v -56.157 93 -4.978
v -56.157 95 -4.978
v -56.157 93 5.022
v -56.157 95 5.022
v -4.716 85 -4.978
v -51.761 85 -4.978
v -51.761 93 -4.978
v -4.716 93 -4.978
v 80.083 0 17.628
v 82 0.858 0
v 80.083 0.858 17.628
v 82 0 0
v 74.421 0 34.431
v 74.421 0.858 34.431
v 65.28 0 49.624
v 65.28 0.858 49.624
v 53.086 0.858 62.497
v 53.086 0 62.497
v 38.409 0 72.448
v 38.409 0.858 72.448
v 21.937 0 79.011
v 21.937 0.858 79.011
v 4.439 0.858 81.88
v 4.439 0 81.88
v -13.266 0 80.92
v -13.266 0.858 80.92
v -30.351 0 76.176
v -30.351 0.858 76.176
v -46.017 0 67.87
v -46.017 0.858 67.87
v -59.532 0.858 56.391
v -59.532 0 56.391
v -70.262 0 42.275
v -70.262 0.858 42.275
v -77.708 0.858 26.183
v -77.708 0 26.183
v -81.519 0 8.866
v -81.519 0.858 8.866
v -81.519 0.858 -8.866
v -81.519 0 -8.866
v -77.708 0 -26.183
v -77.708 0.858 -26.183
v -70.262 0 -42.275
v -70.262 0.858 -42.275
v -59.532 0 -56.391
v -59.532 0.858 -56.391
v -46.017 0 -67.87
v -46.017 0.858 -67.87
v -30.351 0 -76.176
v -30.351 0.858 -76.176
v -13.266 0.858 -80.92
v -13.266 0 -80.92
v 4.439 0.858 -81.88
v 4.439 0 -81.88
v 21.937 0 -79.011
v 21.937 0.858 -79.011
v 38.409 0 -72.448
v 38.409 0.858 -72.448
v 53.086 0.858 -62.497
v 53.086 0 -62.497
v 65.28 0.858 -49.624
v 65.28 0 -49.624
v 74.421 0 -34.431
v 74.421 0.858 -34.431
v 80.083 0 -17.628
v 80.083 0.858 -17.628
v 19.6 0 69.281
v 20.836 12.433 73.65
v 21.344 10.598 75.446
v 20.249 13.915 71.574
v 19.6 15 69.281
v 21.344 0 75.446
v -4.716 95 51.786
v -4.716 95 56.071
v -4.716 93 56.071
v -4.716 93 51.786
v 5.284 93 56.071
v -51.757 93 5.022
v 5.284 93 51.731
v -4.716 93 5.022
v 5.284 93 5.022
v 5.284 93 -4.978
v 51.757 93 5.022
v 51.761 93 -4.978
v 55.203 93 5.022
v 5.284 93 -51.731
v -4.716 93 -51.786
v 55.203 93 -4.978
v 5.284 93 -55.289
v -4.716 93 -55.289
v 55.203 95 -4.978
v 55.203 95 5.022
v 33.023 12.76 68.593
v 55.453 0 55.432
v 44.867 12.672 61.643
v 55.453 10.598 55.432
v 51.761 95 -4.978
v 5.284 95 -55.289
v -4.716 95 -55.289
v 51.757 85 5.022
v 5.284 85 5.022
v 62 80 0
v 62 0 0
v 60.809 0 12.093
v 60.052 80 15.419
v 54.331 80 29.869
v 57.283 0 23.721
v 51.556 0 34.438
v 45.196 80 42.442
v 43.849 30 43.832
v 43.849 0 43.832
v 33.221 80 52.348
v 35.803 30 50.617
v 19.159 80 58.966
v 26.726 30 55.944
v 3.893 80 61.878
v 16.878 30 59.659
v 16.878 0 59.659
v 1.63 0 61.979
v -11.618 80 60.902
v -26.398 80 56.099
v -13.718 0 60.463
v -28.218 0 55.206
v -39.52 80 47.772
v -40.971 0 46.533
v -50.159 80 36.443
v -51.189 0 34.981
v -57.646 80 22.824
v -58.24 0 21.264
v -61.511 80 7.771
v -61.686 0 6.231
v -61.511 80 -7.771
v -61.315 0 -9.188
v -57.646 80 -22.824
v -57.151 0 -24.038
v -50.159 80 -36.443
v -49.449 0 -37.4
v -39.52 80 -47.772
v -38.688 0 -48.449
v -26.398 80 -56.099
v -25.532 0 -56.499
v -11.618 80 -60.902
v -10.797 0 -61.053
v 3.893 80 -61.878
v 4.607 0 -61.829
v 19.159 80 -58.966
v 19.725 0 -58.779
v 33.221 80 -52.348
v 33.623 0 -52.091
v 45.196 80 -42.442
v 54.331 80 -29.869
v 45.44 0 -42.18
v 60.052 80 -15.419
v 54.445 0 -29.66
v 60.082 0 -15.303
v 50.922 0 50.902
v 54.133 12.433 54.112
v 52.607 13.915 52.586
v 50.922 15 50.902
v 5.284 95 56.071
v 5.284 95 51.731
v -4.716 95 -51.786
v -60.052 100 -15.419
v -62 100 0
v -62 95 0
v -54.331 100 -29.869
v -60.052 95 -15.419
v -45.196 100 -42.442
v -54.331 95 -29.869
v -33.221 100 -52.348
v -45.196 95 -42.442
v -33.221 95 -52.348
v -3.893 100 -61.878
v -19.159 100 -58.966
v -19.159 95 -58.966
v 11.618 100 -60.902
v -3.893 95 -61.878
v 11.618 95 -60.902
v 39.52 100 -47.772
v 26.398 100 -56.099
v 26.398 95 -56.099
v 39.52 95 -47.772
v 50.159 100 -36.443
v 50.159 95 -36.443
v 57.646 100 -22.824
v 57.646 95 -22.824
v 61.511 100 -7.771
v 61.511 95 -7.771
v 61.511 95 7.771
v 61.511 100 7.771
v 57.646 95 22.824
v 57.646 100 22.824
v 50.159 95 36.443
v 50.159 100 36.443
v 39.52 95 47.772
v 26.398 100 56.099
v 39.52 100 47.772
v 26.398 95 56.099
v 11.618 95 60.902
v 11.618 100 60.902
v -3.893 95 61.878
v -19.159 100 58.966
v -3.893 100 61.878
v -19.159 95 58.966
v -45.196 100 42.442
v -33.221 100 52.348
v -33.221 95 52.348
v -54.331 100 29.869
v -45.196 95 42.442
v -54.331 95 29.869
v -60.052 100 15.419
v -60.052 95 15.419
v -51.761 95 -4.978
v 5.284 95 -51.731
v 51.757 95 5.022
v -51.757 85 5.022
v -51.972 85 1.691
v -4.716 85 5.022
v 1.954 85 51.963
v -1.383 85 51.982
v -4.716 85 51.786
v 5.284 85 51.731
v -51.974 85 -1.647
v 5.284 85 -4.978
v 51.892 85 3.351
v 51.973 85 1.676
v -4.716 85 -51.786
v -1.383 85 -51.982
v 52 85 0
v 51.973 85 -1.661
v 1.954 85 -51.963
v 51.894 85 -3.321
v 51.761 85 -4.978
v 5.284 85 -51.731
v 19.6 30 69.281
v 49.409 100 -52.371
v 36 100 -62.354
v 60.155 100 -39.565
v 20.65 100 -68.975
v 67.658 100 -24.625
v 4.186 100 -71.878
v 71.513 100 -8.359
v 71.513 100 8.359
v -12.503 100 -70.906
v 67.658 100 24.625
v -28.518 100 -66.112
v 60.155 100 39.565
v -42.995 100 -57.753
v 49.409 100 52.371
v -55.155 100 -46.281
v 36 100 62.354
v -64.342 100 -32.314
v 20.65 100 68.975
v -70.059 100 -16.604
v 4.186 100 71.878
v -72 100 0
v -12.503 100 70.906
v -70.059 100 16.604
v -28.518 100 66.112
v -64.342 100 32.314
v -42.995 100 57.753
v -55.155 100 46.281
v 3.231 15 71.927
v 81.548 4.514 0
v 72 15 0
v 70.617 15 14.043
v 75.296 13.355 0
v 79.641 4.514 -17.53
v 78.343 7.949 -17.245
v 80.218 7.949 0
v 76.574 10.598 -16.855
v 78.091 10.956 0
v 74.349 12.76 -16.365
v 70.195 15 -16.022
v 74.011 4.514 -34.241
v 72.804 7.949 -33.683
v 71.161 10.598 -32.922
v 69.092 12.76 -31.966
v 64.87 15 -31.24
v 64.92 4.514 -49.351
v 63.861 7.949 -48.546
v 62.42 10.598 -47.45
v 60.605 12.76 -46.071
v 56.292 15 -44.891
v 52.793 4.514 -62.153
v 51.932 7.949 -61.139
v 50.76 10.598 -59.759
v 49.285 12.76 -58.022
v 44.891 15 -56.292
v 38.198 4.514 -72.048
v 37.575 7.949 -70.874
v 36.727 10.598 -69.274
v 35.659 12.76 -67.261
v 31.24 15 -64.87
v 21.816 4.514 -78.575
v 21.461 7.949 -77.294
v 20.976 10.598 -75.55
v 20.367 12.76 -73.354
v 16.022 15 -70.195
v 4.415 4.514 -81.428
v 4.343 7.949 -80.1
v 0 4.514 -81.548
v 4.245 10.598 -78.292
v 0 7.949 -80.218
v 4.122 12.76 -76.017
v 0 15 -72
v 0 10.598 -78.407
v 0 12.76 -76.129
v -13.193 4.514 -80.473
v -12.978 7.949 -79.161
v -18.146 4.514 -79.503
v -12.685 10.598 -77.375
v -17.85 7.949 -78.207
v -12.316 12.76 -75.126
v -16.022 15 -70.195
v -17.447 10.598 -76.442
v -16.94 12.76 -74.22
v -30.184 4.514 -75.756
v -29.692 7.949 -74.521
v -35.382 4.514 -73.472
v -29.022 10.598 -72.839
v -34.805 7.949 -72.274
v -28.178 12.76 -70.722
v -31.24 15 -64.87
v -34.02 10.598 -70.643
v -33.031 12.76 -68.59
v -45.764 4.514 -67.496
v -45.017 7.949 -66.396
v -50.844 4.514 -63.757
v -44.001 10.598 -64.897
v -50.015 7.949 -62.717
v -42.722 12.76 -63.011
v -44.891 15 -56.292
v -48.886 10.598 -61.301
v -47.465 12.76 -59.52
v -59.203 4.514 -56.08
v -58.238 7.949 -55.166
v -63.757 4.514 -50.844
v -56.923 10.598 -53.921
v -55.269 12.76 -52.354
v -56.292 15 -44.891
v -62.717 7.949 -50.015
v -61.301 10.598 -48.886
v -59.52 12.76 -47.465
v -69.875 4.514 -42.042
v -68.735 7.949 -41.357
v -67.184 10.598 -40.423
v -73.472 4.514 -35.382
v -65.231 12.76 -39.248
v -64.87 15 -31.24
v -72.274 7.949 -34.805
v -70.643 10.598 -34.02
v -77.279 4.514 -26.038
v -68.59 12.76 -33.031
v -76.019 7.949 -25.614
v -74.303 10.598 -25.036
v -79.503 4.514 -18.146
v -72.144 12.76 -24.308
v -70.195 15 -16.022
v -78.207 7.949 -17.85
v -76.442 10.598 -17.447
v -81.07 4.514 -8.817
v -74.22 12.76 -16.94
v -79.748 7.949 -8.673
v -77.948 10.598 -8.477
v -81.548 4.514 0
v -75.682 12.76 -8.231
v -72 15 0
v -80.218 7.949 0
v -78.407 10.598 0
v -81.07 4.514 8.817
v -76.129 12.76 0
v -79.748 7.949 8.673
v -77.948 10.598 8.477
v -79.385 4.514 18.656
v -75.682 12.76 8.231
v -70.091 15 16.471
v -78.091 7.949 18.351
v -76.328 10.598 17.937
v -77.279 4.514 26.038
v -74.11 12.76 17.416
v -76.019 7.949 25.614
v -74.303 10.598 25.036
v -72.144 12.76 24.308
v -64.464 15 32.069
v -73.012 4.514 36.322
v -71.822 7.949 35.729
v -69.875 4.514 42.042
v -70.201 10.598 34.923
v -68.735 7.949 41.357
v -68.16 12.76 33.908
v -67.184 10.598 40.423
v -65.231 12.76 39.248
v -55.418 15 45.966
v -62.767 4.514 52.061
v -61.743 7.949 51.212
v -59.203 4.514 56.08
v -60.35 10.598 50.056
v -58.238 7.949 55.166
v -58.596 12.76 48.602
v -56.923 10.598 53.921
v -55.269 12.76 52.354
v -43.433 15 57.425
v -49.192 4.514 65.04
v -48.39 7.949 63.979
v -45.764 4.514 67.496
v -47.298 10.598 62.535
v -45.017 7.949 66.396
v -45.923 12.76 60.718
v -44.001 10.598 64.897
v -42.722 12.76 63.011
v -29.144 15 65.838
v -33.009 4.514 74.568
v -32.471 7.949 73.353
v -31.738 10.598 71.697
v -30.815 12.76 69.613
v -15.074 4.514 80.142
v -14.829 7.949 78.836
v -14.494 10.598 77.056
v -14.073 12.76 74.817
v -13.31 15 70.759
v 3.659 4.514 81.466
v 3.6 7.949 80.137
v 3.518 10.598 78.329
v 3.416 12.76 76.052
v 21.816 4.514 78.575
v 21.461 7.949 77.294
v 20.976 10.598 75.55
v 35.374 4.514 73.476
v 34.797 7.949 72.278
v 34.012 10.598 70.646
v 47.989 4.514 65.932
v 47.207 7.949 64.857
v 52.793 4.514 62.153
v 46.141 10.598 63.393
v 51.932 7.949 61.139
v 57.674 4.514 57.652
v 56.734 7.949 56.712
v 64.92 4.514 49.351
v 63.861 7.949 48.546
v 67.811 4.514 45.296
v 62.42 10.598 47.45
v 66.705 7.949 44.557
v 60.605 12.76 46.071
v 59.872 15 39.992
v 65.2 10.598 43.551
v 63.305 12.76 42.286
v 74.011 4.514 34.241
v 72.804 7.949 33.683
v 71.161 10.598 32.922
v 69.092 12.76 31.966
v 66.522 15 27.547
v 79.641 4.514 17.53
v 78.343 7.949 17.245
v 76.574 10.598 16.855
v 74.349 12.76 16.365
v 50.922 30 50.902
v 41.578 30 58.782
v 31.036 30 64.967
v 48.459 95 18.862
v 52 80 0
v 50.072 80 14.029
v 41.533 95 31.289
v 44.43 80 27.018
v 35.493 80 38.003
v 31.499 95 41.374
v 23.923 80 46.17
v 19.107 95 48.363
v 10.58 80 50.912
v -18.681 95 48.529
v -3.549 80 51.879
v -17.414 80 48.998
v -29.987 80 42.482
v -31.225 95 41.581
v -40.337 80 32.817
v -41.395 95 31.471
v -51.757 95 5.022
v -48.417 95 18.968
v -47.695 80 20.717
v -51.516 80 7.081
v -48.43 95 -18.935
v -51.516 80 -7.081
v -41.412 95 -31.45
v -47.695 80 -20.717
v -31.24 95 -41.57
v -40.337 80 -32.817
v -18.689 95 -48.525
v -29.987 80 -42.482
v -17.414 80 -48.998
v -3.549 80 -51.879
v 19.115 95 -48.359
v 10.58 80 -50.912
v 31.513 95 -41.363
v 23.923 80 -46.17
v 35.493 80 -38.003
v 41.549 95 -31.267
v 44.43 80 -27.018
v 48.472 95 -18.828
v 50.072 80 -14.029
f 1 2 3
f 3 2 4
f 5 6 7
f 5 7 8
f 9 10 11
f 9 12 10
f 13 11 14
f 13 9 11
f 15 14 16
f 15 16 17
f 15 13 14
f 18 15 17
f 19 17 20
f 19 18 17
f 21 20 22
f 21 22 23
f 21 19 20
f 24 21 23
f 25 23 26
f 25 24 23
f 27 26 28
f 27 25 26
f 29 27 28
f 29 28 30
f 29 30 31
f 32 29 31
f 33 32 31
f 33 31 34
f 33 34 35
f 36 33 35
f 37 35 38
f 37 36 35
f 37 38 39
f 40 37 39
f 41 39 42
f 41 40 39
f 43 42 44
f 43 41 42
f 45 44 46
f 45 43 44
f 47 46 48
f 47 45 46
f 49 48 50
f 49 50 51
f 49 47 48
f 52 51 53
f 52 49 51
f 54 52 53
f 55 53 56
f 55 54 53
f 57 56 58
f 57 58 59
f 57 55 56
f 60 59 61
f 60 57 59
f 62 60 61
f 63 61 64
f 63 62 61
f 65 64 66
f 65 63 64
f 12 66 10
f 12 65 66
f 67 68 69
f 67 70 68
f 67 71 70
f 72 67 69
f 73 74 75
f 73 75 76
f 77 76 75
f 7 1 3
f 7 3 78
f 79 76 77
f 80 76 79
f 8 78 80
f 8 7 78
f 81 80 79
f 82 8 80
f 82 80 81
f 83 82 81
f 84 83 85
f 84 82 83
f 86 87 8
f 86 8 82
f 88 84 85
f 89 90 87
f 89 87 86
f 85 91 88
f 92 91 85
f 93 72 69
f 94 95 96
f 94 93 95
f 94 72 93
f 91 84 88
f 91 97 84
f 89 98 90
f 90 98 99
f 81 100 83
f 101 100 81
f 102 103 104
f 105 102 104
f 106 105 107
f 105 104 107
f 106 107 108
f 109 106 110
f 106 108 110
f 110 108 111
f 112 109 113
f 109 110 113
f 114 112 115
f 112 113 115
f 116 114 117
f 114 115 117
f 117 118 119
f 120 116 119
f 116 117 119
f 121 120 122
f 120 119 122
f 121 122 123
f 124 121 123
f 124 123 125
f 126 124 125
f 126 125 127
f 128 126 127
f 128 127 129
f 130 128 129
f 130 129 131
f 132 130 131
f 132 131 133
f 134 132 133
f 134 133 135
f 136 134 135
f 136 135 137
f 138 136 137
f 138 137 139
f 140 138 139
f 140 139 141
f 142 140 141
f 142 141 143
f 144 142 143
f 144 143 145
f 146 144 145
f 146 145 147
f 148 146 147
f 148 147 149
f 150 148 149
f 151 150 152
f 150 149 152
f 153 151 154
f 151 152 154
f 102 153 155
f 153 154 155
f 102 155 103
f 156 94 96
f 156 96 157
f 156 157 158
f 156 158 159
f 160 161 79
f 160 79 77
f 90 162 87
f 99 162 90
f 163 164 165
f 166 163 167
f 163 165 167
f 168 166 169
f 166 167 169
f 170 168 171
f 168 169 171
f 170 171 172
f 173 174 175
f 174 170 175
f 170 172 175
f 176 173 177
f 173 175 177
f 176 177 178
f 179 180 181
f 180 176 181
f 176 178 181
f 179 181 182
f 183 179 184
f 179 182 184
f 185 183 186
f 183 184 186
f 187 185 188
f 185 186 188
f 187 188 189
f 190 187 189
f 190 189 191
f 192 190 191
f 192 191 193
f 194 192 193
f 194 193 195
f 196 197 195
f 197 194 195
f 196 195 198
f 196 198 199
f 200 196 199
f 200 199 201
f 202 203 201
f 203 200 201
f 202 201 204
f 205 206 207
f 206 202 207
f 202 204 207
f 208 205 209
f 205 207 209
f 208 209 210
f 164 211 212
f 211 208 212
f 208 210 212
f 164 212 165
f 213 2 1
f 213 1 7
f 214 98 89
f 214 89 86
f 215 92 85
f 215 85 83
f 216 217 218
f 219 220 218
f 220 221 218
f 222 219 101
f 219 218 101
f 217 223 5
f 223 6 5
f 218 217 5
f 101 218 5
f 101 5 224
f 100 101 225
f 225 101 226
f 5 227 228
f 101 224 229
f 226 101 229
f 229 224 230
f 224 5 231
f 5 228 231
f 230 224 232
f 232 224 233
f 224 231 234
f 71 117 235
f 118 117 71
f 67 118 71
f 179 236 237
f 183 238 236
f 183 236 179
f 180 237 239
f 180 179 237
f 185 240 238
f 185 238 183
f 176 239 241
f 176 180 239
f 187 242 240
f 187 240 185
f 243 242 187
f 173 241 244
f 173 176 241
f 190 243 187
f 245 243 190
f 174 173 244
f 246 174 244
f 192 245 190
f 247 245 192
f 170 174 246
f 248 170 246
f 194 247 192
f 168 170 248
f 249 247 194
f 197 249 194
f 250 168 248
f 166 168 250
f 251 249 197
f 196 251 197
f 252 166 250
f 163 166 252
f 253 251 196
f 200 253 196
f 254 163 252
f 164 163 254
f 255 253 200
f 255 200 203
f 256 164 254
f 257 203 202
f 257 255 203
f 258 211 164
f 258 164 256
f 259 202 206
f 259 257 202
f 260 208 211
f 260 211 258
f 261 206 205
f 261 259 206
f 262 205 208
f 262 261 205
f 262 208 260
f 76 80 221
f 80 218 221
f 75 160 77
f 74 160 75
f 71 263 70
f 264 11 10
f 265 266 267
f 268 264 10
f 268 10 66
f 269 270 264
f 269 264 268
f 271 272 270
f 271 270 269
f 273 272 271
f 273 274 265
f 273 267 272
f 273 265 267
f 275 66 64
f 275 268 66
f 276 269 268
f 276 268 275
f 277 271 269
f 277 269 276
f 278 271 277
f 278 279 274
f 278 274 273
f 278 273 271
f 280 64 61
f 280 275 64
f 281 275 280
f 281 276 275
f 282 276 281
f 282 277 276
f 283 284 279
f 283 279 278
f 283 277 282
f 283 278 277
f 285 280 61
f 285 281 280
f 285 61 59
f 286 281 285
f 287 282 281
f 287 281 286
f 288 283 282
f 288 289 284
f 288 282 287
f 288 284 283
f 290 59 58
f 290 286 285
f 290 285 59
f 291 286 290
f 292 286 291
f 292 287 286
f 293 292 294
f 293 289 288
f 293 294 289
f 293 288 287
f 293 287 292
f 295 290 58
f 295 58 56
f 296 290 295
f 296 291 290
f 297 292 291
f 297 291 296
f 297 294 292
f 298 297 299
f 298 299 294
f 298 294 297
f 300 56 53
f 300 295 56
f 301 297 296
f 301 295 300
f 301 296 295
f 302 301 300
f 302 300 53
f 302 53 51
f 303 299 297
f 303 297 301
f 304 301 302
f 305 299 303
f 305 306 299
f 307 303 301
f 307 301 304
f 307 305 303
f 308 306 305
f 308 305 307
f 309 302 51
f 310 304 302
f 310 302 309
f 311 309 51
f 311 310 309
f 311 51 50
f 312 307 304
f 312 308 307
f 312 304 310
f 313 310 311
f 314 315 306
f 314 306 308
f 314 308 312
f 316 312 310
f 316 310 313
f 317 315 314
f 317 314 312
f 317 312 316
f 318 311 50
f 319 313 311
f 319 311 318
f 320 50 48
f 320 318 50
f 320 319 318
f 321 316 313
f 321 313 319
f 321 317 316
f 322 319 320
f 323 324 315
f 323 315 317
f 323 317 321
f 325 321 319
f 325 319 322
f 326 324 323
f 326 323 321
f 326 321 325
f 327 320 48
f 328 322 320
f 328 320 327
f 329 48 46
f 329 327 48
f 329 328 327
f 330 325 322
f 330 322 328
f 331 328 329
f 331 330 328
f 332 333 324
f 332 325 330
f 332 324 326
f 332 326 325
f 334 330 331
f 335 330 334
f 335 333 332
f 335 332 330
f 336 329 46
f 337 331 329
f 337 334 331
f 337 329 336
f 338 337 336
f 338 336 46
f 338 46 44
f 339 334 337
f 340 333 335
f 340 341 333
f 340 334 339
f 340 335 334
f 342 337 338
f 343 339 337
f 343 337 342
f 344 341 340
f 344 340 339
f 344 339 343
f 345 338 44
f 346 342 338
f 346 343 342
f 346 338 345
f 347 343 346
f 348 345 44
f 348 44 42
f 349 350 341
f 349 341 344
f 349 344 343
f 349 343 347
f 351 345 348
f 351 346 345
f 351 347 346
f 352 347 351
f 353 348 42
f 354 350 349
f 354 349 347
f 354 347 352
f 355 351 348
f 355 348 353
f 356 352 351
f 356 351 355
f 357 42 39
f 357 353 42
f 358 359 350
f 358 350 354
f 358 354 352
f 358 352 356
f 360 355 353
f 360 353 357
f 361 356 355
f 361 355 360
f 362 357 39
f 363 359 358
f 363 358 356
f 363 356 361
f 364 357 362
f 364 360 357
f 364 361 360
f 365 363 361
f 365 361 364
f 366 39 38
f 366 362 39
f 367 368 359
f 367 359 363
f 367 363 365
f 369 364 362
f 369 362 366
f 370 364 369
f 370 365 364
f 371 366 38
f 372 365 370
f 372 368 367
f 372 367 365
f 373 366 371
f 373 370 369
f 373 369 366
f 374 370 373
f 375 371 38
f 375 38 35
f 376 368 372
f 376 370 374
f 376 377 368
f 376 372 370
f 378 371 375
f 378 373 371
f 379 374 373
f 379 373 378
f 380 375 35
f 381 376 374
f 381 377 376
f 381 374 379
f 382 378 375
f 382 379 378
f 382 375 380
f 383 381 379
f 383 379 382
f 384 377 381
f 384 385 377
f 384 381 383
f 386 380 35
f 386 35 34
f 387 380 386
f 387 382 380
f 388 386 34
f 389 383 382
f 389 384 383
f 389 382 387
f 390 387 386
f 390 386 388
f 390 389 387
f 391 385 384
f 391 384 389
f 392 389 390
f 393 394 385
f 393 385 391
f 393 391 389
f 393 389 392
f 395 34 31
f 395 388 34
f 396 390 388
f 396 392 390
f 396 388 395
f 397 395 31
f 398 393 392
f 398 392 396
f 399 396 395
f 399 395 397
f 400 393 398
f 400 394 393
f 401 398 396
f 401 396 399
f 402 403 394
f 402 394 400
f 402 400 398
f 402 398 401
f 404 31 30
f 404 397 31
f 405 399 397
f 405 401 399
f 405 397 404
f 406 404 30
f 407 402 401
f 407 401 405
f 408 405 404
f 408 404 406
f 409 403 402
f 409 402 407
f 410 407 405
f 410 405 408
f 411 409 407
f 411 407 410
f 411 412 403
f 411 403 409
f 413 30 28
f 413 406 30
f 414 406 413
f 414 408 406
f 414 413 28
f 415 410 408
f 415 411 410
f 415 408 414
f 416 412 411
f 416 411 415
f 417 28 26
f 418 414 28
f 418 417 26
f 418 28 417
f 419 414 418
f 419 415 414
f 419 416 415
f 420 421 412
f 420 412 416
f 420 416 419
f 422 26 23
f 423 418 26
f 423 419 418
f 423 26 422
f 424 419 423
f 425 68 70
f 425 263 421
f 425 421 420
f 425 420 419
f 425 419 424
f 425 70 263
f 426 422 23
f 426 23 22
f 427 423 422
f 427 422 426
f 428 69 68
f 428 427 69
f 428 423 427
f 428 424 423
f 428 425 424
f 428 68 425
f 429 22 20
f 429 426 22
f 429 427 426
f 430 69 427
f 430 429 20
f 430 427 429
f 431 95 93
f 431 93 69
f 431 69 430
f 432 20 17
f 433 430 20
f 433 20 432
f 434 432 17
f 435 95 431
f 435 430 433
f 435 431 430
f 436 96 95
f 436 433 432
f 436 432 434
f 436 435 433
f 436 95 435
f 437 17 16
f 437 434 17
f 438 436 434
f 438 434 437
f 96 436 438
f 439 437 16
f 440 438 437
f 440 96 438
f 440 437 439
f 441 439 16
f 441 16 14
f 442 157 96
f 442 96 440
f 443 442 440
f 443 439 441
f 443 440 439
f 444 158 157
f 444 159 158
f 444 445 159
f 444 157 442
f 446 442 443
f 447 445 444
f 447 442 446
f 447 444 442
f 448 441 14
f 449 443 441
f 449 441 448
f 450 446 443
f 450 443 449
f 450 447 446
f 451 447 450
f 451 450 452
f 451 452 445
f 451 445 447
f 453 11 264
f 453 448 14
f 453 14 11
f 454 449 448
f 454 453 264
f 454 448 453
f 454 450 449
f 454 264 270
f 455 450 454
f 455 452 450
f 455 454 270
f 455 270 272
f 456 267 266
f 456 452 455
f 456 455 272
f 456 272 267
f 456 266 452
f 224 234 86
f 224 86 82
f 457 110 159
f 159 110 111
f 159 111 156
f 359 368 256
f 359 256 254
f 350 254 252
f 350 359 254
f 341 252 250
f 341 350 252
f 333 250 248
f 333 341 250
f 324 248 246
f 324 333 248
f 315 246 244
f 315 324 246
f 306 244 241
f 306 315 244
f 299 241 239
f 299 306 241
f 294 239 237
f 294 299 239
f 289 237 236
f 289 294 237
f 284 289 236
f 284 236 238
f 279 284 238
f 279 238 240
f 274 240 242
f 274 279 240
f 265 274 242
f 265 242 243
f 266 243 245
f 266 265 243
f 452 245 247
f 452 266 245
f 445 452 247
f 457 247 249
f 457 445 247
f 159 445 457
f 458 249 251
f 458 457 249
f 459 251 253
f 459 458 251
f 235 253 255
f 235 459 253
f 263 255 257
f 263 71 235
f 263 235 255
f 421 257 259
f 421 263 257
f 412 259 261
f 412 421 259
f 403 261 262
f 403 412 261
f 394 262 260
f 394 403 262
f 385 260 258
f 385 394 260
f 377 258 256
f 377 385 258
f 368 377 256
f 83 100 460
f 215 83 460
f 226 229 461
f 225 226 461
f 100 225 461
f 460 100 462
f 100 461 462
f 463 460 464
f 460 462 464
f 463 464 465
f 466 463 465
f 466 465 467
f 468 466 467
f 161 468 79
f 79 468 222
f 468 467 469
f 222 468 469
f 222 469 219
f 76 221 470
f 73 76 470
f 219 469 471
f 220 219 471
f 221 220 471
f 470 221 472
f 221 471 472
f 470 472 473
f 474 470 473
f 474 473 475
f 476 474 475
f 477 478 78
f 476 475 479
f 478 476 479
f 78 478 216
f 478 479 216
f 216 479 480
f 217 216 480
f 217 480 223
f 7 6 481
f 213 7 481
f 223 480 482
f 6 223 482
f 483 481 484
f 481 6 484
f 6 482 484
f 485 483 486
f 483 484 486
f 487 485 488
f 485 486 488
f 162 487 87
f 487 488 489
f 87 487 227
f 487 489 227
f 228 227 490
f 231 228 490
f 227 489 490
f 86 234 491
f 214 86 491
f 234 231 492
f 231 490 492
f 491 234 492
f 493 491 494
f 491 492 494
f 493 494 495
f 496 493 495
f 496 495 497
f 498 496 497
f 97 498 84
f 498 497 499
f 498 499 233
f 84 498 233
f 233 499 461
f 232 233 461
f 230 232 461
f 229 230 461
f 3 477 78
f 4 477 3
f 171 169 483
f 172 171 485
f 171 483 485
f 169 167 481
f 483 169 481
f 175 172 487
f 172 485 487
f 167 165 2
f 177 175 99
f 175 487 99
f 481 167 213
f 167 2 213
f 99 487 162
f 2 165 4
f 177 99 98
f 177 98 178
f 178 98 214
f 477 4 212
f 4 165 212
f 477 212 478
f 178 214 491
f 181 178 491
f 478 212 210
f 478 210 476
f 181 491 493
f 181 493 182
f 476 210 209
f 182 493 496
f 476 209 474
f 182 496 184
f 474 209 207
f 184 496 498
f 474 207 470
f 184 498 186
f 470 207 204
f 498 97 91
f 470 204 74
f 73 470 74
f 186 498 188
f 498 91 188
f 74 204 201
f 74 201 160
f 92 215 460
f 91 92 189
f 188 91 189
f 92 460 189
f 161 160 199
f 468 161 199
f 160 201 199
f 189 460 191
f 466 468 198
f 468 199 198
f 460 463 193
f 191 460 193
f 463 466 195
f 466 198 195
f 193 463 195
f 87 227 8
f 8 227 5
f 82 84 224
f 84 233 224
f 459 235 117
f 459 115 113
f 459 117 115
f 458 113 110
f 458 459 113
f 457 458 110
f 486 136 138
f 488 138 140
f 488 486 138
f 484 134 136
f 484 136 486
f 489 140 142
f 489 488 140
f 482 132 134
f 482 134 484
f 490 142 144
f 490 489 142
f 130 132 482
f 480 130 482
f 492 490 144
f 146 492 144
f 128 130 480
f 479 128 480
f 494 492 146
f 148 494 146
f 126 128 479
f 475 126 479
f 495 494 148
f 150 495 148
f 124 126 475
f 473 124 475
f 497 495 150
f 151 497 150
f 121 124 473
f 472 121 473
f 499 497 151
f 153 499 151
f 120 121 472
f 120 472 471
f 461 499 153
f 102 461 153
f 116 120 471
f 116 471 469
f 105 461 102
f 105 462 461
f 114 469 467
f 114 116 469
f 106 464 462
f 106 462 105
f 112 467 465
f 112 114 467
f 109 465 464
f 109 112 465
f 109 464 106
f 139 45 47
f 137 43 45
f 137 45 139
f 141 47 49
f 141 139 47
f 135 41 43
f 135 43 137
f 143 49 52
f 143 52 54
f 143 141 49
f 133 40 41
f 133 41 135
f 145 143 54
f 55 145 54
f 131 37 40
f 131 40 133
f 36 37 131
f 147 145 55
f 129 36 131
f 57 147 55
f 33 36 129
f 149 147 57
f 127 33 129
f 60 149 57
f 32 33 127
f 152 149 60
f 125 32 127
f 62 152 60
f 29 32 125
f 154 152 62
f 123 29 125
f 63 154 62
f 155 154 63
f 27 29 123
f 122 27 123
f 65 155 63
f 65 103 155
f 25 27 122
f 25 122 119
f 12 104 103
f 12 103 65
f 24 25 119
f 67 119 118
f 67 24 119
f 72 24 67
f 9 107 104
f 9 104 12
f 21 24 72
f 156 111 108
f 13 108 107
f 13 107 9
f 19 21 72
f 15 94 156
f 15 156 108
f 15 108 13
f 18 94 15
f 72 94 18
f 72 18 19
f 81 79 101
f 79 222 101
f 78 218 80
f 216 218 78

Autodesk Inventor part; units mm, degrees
ref_plane "YZ Plane" through (0, 0, 0) normal (1, 0, 0) x (0, 1, 0)
ref_plane "XZ Plane" through (0, 0, 0) normal (0, 1, 0) x (-1, 0, 0)
ref_plane "XY Plane" through (0, 0, 0) normal (0, 0, 1) x (1, 0, 0)
sketch "Boceto1" plane through (0, 0, 0) normal (0, 1, 0) x (-1, 0, 0)
  circle A0 centre (0, 0) radius 62
  circle A1 centre (0, 0) radius 72
  circle A2 centre (0, 0) radius 52
  dimension "d5" = 124
  dimension "d6" = 144
  dimension "d7" = 104
extrude "Extrusión1" add sketch "Boceto1" along normal blind 100 contours A1
sketch "Boceto5" plane through (0, 0, 0) normal (0, -1, 0) x (1, 0, 0)
  circle A0 centre (0, 0) radius 52
  circle A1 centre (0, 0) radius 62
  dimension "d11" = 104
  dimension "d12" = 124
extrude "Extrusión2" add sketch "Boceto5" against normal blind 95
sketch "Boceto6" plane through (0, 0, 0) normal (0, -1, 0) x (1, 0, 0)
  circle A0 centre (0, 0) radius 52
  circle A1 centre (0, 0) radius 62
  dimension "d15" = 104
  dimension "d16" = 124
extrude "Extrusión3" cut sketch "Boceto6" against normal blind 80
sketch "Boceto7" plane through (0, 0, 0) normal (0, -1, 0) x (1, 0, 0)
  circle A0 centre (0, 0) radius 82
  circle A1 centre (0, 0) radius 72
  dimension "d19" = 164
  dimension "d20" = 144
extrude "Extrusión4" add sketch "Boceto7" against normal blind 15
fillet "Empalme1" radius 15 1 edges at (-82, 15, 0)
sketch "Boceto8" plane through (0, 0, 0) normal (0, -1, 0) x (1, 0, 0)
  arc A0 (43.8491, 43.8321) -> (16.8777, 59.6586) centre (0, 0) ccw
  line L0 (43.8491, 43.8321) -> (50.9216, 50.9018)
  line L1 (16.8777, 59.6586) -> (19.5999, 69.2809)
  line L2 (19.5999, 69.2809) -> (21.3442, 75.4464)
  line L3 (21.3442, 75.4464) -> (55.4532, 55.4317)
  line L4 (55.4532, 55.4317) -> (50.9216, 50.9018)
  dimension "d25" = 124
extrude "Extrusión5" cut sketch "Boceto8" against normal blind 30
sketch "Boceto9" plane through (0, 95, 0) normal (0, 1, 0) x (1, 0, 0)
  line L0 (51.775, -4.7614) -> (51.775, 6.1116)
  line L1 (5.2843, 55.289) -> (-4.7157, 55.289)
  line L2 (5.2843, 55.289) -> (5.2843, -56.0708)
  line L3 (5.2843, -56.0708) -> (-4.7157, -56.0708)
  line L4 (-4.7157, -56.0708) -> (-4.7157, 55.289)
  line L5 (5.2843, 55.289) -> (-4.7157, 55.289)
  line L6 (5.2843, 55.289) -> (5.2843, -56.0708)
  line L7 (5.2843, -56.0708) -> (-4.7157, -56.0708)
  line L8 (-4.7157, -56.0708) -> (-4.7157, 55.289)
  line L9 (-56.1571, 4.9777) -> (-56.1571, -5.0223)
  line L10 (-56.1571, 4.9777) -> (55.2027, 4.9777)
  line L11 (55.2027, 4.9777) -> (55.2027, -5.0223)
  line L12 (55.2027, -5.0223) -> (-56.1571, -5.0223)
extrude "Extrusión6" cut sketch "Boceto9" against normal blind 10
sketch "Boceto10" plane through (0, 85, 0) normal (0, 1, 0) x (1, 0, 0)
  line L0 (-51.7569, -5.0223) -> (-56.1571, -5.0223) projected
  line L1 (55.2027, -5.0223) -> (51.7569, -5.0223) projected
  line L2 (-56.1571, -5.0223) -> (55.2027, -5.0223)
  line L3 (55.2027, -5.0223) -> (55.2027, 4.9777)
  line L4 (-56.1571, 4.9777) -> (-51.7612, 4.9777) projected
  line L5 (55.2027, 4.9777) -> (-56.1571, 4.9777)
  line L6 (-56.1571, -5.0223) -> (-56.1571, 4.9777) projected
  line L7 (-56.1571, 4.9777) -> (-56.1571, -5.0223)
  line L8 (-4.7157, -56.0708) -> (-4.7157, -51.7857) projected
  line L9 (5.2843, -56.0708) -> (-4.7157, -56.0708) projected
  line L10 (-4.7157, -56.0708) -> (5.2843, -56.0708)
  line L11 (5.2843, 55.289) -> (5.2843, 51.7308) projected
  line L12 (5.2843, -56.0708) -> (5.2843, 55.289)
  line L13 (-4.7157, 55.289) -> (5.2843, 55.289) projected
  line L14 (5.2843, 55.289) -> (-4.7157, 55.289)
  line L15 (-4.7157, 55.289) -> (-4.7157, -56.0708)
  point P0 (0, 0)
extrude "Extrusión7" add sketch "Boceto10" along normal blind 8
sketch "Boceto11" plane through (0, 85, 0) normal (0, -1, 0) x (1, 0, 0)
  line L0 (0, 0) -> (0, -9.6645)
properties part number "BaseRod_Pepu"
